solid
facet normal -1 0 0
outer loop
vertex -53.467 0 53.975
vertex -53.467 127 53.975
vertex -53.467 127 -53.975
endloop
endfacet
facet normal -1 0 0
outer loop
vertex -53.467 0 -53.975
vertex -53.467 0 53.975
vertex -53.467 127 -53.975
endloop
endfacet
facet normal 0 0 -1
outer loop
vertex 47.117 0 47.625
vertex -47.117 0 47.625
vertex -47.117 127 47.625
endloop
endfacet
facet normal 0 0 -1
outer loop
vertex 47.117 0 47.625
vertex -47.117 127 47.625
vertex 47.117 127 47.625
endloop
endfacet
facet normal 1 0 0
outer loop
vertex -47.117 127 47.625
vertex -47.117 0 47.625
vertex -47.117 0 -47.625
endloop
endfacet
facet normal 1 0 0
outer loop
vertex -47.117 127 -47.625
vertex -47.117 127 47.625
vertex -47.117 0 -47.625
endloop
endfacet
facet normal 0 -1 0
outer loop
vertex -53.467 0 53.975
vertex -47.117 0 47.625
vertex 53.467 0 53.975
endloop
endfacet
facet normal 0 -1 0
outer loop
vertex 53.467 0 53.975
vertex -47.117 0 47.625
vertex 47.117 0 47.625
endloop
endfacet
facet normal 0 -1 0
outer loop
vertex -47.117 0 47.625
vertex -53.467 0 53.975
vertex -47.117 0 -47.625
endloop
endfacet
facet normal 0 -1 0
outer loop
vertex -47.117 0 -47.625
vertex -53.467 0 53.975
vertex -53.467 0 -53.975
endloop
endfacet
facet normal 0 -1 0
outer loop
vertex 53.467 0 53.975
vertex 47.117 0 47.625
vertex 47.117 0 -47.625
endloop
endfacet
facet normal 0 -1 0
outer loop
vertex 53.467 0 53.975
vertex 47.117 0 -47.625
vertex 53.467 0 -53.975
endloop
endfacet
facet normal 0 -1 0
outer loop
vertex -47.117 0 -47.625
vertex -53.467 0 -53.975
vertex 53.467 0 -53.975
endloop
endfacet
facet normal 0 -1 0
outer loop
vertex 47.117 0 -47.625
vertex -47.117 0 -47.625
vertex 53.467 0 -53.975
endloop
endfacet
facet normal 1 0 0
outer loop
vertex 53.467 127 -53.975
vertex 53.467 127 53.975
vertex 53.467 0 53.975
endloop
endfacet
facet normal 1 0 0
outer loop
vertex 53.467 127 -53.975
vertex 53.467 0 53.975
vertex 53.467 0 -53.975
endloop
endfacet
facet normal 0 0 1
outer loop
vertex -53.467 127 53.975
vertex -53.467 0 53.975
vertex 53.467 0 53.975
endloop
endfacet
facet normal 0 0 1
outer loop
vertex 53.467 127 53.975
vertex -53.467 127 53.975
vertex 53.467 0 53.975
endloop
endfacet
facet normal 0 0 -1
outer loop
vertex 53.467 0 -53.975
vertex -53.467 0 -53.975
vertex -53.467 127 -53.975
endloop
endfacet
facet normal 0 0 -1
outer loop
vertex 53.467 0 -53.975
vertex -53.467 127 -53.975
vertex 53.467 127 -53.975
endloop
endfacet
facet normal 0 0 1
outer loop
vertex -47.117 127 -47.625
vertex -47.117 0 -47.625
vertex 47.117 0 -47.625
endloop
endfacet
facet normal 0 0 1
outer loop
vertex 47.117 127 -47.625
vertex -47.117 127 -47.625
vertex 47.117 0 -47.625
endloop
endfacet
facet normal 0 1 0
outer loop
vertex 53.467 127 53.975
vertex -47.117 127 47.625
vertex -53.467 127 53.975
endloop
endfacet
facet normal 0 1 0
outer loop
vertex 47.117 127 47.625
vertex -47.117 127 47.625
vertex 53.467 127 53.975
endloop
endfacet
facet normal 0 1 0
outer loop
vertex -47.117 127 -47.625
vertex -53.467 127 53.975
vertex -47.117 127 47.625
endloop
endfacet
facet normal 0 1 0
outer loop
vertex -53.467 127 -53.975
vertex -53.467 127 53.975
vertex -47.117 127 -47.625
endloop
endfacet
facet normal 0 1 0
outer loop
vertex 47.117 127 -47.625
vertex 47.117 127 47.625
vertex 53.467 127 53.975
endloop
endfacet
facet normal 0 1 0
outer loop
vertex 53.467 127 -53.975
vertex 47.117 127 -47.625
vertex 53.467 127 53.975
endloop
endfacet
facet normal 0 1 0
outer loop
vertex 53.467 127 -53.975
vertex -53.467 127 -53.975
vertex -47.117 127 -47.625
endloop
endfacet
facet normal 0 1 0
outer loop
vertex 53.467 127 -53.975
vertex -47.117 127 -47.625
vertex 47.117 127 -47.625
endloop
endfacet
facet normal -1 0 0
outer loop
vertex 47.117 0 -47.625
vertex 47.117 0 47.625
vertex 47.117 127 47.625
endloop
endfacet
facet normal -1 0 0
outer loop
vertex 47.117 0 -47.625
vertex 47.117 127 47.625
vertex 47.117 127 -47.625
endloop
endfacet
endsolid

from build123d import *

# Parameters (mm, degrees)
SKETCH2_W           = 106.934
SKETCH2_H           = 107.95
BOSS_EXTRUDE1_DEPTH = 127
SHELL1_T            = -6.35


with BuildPart() as part:
    # Sketch2 → Boss-Extrude1 (new body)
    with BuildSketch(Plane(origin=(0, 0, 0), x_dir=(1, 0, 0), z_dir=(0, 1, 0))):
        Rectangle(SKETCH2_W, SKETCH2_H)
    extrude(amount=BOSS_EXTRUDE1_DEPTH)

    # Shell1
    shell1_openings = [part.faces().sort_by_distance(p)[0] for p in [
        (0, 127, 0),
        (0, 0, 0),
    ]]
    offset(amount=SHELL1_T, openings=shell1_openings, kind=Kind.INTERSECTION)


solid = part.part
